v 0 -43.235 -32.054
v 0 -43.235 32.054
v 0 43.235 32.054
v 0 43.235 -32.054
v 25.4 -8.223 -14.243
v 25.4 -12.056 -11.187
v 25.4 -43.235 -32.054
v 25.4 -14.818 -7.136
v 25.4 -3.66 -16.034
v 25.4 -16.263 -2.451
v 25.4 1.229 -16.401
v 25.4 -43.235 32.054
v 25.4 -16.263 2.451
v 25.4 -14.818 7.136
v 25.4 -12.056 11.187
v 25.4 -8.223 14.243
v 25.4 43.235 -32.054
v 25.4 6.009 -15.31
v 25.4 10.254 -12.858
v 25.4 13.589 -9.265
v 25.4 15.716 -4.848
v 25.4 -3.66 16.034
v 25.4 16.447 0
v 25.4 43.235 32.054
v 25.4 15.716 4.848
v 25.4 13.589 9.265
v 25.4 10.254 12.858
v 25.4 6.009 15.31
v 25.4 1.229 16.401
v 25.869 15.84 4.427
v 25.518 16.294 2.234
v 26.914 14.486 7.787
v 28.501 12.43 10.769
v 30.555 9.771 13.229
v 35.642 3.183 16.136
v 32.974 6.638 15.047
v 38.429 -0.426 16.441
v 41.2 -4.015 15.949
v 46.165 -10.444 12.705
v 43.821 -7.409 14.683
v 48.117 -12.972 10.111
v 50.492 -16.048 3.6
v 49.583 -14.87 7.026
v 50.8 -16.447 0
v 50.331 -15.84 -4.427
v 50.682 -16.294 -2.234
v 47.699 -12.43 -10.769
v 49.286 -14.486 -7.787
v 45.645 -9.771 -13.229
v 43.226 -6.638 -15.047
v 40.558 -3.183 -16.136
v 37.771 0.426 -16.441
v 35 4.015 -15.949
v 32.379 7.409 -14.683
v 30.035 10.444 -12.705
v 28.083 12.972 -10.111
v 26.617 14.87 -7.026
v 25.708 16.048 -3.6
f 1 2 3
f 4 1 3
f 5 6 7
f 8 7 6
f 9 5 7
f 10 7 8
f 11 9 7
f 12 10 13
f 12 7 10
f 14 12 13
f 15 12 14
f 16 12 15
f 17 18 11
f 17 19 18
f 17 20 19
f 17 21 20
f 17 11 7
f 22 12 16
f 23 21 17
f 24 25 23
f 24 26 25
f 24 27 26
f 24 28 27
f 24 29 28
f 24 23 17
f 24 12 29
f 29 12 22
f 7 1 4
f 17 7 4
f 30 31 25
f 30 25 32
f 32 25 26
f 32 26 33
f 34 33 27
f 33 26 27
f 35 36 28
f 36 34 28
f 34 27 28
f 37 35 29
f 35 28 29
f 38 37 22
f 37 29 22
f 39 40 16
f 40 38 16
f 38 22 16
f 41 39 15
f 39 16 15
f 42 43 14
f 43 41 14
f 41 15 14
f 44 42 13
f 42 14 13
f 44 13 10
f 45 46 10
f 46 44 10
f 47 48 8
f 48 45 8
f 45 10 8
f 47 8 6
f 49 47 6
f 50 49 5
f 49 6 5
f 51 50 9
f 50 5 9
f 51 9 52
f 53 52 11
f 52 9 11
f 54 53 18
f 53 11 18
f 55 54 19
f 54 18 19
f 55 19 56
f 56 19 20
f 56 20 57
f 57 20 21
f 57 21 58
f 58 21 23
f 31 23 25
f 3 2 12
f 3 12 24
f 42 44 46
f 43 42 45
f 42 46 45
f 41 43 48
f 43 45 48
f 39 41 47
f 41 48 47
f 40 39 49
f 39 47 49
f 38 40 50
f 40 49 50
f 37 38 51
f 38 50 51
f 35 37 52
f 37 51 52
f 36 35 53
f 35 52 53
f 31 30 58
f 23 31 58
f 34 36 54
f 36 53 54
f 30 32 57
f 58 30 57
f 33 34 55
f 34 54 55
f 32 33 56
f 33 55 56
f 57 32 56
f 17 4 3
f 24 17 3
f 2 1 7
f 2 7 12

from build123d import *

# Parameters (mm, degrees)
F0_W     = 86.47044
F0_H     = 64.107388
F1_DEPTH = 25.4
F2_R     = 16.446559
F3_DEPTH = 25.4
F5_DEPTH = 64.108388


with BuildPart() as f1:
    # F0 (on Right) → F1 (new body)
    with BuildSketch(Plane.YZ):
        Rectangle(F0_W, F0_H)
    extrude(amount=F1_DEPTH)

    # F2 (on face) → F3 (join)
    with BuildSketch(Plane.YZ.offset(25.4)):
        Circle(F2_R)
    extrude(amount=F3_DEPTH)

    # F4 (on face) → F5 (cut, through all)
    with BuildSketch(Plane(origin=(0, 0, -32.053694), x_dir=(1, 0, 0), z_dir=(0, 0, -1))):
        Polygon((50.8, -16.446559), (50.8, 16.446559), (25.4, -16.446559), align=None)
    extrude(amount=-F5_DEPTH, mode=Mode.SUBTRACT)


solid = f1.part
